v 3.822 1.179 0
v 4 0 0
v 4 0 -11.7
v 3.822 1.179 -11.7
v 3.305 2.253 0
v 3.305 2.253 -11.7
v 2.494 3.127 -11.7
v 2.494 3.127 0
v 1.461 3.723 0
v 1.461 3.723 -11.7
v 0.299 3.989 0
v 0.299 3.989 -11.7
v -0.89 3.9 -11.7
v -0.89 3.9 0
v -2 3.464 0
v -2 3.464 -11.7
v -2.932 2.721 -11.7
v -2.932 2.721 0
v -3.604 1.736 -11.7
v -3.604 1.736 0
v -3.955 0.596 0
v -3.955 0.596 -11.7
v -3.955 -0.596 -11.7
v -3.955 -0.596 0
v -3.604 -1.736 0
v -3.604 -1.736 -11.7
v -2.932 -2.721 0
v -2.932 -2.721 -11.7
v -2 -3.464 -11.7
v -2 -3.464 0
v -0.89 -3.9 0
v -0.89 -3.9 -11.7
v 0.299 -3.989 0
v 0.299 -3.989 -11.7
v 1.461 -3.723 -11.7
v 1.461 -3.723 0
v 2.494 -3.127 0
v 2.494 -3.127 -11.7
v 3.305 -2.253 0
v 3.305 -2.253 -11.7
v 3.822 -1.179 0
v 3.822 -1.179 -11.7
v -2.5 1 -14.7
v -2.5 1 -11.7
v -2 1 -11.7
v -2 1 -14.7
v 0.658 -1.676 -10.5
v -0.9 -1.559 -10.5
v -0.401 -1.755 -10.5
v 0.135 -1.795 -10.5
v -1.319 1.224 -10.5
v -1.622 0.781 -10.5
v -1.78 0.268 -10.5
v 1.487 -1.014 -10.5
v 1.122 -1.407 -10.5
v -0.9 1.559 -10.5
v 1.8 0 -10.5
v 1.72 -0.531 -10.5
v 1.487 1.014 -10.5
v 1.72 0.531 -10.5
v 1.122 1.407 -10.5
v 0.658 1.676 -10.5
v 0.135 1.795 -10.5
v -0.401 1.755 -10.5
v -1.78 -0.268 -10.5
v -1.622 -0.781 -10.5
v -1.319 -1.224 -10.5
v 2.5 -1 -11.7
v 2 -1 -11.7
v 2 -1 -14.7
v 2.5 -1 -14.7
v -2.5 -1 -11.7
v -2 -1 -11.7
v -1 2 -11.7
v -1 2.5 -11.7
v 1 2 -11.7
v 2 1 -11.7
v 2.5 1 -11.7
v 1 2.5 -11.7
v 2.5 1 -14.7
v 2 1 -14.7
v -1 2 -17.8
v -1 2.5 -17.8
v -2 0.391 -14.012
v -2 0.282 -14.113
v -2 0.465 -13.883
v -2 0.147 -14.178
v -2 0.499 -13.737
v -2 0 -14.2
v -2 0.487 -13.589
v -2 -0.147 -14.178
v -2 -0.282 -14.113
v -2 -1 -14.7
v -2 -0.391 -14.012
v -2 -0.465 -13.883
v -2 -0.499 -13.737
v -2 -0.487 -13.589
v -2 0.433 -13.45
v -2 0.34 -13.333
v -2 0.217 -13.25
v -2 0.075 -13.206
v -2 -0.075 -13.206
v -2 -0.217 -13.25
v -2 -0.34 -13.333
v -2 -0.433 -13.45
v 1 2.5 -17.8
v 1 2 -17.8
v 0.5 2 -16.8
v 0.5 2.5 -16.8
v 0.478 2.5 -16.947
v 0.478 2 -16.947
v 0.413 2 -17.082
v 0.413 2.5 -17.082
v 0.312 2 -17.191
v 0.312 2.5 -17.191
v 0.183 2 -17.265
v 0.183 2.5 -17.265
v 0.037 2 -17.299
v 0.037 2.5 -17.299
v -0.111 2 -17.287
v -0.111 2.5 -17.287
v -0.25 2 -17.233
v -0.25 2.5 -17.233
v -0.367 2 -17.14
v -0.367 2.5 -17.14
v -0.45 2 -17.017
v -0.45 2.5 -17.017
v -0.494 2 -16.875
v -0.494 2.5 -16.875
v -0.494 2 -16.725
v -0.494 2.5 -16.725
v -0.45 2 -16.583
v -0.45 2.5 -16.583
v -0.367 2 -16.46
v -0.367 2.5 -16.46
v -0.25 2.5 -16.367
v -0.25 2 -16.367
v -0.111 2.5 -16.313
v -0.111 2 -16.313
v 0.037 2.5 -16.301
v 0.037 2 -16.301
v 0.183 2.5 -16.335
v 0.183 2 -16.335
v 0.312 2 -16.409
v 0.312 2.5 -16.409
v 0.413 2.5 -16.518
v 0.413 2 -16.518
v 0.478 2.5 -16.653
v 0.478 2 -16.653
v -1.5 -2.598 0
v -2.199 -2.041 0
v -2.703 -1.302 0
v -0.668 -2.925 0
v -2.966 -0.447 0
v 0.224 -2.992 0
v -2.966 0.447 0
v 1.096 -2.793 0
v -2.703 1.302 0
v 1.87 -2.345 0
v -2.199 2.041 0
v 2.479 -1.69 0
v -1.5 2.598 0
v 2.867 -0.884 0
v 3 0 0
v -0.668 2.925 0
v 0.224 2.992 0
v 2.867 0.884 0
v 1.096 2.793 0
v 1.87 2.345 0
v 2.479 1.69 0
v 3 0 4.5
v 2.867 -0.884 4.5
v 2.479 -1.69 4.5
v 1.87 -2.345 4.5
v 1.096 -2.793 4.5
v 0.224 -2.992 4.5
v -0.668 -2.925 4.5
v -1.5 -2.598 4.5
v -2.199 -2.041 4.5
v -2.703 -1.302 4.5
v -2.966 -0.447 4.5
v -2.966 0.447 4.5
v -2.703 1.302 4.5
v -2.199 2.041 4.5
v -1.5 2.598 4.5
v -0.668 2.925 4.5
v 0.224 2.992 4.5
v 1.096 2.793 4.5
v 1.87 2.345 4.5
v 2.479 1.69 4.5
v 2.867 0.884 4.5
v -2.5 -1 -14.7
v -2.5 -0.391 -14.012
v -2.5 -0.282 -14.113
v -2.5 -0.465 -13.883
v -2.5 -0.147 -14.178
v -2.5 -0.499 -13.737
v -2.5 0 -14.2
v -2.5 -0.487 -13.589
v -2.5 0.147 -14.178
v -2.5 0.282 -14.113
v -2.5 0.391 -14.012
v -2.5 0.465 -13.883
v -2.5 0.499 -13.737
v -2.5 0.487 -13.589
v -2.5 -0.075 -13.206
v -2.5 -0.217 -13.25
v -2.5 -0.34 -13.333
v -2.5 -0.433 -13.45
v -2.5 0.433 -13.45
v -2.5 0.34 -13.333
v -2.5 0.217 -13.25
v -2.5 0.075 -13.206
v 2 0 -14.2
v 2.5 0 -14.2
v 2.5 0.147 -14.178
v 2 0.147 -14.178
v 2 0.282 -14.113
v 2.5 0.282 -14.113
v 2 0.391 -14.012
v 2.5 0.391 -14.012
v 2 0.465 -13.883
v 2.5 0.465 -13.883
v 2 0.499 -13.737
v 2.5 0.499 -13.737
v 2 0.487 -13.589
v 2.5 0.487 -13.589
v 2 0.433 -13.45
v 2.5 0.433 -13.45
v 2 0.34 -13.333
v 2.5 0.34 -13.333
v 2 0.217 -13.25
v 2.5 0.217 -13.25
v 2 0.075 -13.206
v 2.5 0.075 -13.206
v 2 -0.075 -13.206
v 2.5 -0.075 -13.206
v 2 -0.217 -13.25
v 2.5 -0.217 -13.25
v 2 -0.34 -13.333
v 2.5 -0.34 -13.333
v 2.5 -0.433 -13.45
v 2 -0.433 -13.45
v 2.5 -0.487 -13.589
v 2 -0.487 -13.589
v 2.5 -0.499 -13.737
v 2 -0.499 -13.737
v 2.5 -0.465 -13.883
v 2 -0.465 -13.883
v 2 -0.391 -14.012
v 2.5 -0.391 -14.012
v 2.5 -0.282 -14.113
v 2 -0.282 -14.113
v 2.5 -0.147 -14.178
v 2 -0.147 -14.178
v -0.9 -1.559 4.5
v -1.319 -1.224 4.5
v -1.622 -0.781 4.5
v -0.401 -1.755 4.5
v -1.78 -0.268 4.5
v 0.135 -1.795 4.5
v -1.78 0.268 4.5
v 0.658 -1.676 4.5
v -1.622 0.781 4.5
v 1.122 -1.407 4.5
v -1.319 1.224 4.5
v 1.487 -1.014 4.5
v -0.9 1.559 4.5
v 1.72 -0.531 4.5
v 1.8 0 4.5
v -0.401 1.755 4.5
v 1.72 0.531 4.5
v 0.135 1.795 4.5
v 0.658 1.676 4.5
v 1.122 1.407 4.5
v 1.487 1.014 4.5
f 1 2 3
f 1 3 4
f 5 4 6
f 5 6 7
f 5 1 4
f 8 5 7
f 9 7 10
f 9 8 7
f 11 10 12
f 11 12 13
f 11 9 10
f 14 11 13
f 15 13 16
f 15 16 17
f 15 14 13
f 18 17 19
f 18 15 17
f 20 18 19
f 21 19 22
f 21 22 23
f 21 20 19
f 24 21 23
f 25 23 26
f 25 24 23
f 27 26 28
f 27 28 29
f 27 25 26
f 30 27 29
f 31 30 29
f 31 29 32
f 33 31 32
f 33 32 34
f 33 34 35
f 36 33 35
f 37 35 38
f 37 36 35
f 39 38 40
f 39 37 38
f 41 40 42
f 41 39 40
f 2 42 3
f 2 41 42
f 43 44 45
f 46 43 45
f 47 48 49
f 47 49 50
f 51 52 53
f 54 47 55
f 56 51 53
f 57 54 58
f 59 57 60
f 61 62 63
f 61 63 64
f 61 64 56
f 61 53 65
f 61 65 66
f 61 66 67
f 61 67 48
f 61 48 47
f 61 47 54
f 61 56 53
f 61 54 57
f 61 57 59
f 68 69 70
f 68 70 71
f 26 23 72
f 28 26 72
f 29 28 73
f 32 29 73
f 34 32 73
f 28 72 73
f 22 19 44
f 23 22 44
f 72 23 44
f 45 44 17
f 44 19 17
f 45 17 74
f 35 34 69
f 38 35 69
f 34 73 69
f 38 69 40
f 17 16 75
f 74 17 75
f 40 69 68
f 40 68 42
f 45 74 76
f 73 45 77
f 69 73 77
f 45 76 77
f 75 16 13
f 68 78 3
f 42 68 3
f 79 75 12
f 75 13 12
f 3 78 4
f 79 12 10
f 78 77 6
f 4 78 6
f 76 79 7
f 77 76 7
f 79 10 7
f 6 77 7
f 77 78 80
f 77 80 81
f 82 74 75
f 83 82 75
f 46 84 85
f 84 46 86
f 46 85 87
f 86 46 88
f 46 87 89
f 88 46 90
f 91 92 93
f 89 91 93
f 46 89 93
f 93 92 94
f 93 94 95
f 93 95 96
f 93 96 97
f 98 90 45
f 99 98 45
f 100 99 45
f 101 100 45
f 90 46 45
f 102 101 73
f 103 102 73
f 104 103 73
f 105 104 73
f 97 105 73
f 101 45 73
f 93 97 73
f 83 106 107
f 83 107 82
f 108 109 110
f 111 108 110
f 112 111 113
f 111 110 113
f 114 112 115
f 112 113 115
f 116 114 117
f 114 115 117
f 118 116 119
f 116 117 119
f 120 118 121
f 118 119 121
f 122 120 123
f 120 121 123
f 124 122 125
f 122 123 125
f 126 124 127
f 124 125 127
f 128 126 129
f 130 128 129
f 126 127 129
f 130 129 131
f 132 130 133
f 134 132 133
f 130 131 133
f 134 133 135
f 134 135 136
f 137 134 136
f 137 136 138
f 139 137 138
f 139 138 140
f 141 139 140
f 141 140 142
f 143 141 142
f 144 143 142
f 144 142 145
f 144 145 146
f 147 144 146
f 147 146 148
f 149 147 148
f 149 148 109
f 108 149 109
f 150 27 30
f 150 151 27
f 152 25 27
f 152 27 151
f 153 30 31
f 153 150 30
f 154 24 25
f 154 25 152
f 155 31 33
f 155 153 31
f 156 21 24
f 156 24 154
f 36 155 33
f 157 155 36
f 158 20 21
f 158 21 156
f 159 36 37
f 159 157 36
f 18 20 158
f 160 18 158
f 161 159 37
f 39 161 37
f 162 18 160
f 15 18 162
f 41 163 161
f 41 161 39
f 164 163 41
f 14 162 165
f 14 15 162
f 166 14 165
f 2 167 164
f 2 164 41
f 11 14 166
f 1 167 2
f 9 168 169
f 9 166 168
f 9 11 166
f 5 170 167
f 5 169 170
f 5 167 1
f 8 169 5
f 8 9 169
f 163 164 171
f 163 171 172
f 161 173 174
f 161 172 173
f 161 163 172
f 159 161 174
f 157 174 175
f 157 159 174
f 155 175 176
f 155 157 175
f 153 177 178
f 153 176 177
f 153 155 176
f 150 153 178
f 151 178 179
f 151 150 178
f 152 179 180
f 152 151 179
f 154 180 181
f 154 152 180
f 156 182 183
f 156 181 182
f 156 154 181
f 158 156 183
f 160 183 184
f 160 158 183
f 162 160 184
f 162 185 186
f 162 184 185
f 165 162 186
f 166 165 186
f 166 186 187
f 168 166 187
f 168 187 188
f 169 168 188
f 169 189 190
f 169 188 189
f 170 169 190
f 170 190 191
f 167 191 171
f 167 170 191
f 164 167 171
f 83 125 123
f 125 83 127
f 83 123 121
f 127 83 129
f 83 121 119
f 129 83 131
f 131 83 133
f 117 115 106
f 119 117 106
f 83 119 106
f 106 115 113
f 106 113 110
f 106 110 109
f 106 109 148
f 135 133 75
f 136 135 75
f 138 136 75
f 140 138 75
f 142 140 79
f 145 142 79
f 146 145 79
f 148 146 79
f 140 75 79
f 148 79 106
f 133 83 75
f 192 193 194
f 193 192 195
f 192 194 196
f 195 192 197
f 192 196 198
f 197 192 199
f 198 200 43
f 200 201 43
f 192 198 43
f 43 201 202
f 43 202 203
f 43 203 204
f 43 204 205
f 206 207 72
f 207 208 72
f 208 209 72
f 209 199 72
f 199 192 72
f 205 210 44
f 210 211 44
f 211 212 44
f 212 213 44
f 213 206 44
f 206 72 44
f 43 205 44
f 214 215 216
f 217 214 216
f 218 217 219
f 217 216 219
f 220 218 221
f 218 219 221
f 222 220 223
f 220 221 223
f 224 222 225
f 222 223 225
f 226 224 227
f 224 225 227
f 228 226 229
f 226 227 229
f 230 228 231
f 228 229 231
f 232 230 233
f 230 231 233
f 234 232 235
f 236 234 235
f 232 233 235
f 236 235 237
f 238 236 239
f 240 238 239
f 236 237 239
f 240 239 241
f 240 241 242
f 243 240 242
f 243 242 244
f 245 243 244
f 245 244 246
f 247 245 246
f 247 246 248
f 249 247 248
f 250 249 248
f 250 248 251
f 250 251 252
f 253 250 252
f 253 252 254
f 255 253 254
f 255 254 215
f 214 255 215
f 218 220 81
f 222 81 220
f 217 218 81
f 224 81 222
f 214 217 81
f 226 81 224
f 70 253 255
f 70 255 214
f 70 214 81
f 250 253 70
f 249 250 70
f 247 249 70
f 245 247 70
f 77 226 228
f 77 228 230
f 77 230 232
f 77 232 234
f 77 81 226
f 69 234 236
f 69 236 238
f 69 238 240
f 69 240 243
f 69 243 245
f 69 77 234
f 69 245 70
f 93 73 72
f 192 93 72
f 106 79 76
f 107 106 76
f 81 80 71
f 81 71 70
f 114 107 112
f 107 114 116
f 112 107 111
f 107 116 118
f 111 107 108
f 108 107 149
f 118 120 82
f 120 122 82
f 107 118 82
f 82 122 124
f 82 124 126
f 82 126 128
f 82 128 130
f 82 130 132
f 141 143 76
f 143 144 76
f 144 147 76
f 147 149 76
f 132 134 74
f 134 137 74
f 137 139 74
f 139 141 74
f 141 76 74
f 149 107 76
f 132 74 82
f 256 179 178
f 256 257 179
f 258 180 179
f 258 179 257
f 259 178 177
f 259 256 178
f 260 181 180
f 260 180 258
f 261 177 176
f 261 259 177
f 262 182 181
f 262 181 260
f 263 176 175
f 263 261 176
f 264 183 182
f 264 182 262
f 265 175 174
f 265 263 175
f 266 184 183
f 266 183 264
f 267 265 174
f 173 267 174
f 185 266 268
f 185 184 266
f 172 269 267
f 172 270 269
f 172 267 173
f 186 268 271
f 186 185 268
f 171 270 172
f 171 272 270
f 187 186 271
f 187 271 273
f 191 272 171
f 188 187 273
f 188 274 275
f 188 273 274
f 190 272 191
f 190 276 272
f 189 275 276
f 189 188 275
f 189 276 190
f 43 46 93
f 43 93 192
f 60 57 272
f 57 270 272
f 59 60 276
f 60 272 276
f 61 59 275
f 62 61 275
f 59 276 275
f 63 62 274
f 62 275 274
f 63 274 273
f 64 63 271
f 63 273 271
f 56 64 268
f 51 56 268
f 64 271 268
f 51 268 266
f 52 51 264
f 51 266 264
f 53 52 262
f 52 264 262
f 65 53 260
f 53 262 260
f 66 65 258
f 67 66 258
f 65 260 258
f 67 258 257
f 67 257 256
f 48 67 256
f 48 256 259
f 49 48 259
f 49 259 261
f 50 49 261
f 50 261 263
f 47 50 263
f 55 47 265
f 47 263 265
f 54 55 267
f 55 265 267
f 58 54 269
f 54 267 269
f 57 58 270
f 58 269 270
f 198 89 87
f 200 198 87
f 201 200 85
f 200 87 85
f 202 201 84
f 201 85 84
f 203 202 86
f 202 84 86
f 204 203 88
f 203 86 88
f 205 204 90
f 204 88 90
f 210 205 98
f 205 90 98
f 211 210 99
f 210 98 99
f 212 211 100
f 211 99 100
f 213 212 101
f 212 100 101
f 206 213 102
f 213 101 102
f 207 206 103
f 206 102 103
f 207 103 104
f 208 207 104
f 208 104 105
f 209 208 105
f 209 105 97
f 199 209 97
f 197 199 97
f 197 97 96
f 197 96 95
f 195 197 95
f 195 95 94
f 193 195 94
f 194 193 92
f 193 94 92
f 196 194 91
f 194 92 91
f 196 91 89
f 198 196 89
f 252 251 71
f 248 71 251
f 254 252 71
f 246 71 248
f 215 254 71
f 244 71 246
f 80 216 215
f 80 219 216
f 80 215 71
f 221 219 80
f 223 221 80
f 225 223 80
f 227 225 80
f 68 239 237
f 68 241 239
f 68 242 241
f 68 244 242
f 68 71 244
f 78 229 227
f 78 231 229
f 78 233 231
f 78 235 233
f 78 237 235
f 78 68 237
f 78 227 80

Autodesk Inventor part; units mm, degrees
ref_plane "YZ Plane" through (0, 0, 0) normal (1, 0, 0) x (0, 1, 0)
ref_plane "XZ Plane" through (0, 0, 0) normal (0, 1, 0) x (-1, 0, 0)
ref_plane "XY Plane" through (0, 0, 0) normal (0, 0, 1) x (1, 0, 0)
sketch "Sketch1" plane through (0, 0, 0) normal (0, 0, 1) x (1, 0, 0)
  circle A0 centre (0, 0) radius 4
  dimension "d0" = 8
extrude "Extrusion1" add sketch "Sketch1" against normal blind 11.7
sketch "Sketch2" plane through (0, 0, 0) normal (0, 0, 1) x (1, 0, 0)
  circle A0 centre (0, 0) radius 4 projected
  circle A1 centre (0, 0) radius 3
  dimension "d3" = 6
extrude "Extrusion2" add sketch "Sketch2" along normal blind 4.5 contours A1
thread "Thread1" size "M6x0.5" class "6g" standard "ANSI Metric M Profile" full length
sketch "Sketch3" plane through (0, 0, 4.5) normal (0, 0, 1) x (1, 0, 0)
  circle A0 centre (0, 0) radius 3 projected
  circle A1 centre (0, 0) radius 1.8
  dimension "d8" = 3.6
extrude "Extrusion3" cut sketch "Sketch3" against normal blind 15 contours A1
sketch "Sketch4" plane through (0, 0, -11.7) normal (0, 0, -1) x (-1, 0, 0)
  circle A0 centre (0, 0) radius 4 construction
  line L0 (0, 0) -> (0, 2.7273) construction
  line L1 (-2.5, 1) -> (-2, 1)
  line L2 (-2, 1) -> (-2, -1)
  line L3 (-2, -1) -> (-2.5, -1)
  line L4 (-2.5, -1) -> (-2.5, 1)
  line L5 (2.5, 1) -> (2, 1)
  line L6 (2, 1) -> (2, -1)
  line L7 (2, -1) -> (2.5, -1)
  line L8 (2.5, -1) -> (2.5, 1)
  dimension "d11" = 2
  dimension "d12" = 0.5
  dimension "d13" = 2
  dimension "d14" = 1
extrude "Extrusion4" add sketch "Sketch4" along normal blind 3
sketch "Sketch5" plane through (0, 0, -11.7) normal (0, 0, -1) x (-1, 0, 0)
  circle A0 centre (0, 0) radius 4 projected
  line L0 (-1, 2) -> (1, 2)
  line L1 (1, 2) -> (1, 2.5)
  line L2 (1, 2.5) -> (-1, 2.5)
  line L3 (-1, 2.5) -> (-1, 2)
  line L4 (-1, 2) -> (1, 2.5) construction
  line L5 (1, 2) -> (-1, 2.5) construction
  point P0 (0, 2.25)
  dimension "d17" = 2
  dimension "d18" = 0.5
  dimension "d19" = 2
  dimension "d20" = 1
extrude "Extrusion5" add sketch "Sketch5" along normal blind 6.1 contours L3 L2 L1 L0
sketch "Sketch6" plane through (2.5, -1, -11.7) normal (1, 0, 0) x (0, 0, -1)
  line L0 (3, 2) -> (3, 0) projected
  circle A0 centre (2, 1) radius 0.5
  point P0 (-11.7, 1)
  dimension "d23" = 1
  dimension "d24" = 1
extrude "Extrusion6" cut sketch "Sketch6" against normal through all
sketch "Sketch7" plane through (-1, 2.5, -11.7) normal (0, 1, 0) x (1, 0, 0)
  line L0 (0, 6.1) -> (2, 6.1) projected
  circle A0 centre (1, 5.1) radius 0.5
  point P0 (1, -11.7)
  dimension "d27" = 1
  dimension "d28" = 1
extrude "Extrusion7" cut sketch "Sketch7" against normal blind 6.1
sketch "Sketch8" plane through (2.5, -1, -11.7) normal (1, 0, 0) x (0, 0, -1)
  circle A0 centre (2, 1) radius 0.5 projected
sketch "Sketch9" plane through (-1, 2, -11.7) normal (0, -1, 0) x (1, 0, 0)
  circle A0 centre (1, -5.1) radius 0.5 projected
sketch "Sketch10" plane through (-2.5, -1, -11.7) normal (-1, 0, 0) x (0, 0, 1)
  circle A0 centre (-2, 1) radius 0.5 projected
equation "\"d14\" = 0.5 * d11"
equation "\"d20\" = 0.5 * d17"
properties part number "MJ-074N" material "Nickel-Copper Alloy 400"
